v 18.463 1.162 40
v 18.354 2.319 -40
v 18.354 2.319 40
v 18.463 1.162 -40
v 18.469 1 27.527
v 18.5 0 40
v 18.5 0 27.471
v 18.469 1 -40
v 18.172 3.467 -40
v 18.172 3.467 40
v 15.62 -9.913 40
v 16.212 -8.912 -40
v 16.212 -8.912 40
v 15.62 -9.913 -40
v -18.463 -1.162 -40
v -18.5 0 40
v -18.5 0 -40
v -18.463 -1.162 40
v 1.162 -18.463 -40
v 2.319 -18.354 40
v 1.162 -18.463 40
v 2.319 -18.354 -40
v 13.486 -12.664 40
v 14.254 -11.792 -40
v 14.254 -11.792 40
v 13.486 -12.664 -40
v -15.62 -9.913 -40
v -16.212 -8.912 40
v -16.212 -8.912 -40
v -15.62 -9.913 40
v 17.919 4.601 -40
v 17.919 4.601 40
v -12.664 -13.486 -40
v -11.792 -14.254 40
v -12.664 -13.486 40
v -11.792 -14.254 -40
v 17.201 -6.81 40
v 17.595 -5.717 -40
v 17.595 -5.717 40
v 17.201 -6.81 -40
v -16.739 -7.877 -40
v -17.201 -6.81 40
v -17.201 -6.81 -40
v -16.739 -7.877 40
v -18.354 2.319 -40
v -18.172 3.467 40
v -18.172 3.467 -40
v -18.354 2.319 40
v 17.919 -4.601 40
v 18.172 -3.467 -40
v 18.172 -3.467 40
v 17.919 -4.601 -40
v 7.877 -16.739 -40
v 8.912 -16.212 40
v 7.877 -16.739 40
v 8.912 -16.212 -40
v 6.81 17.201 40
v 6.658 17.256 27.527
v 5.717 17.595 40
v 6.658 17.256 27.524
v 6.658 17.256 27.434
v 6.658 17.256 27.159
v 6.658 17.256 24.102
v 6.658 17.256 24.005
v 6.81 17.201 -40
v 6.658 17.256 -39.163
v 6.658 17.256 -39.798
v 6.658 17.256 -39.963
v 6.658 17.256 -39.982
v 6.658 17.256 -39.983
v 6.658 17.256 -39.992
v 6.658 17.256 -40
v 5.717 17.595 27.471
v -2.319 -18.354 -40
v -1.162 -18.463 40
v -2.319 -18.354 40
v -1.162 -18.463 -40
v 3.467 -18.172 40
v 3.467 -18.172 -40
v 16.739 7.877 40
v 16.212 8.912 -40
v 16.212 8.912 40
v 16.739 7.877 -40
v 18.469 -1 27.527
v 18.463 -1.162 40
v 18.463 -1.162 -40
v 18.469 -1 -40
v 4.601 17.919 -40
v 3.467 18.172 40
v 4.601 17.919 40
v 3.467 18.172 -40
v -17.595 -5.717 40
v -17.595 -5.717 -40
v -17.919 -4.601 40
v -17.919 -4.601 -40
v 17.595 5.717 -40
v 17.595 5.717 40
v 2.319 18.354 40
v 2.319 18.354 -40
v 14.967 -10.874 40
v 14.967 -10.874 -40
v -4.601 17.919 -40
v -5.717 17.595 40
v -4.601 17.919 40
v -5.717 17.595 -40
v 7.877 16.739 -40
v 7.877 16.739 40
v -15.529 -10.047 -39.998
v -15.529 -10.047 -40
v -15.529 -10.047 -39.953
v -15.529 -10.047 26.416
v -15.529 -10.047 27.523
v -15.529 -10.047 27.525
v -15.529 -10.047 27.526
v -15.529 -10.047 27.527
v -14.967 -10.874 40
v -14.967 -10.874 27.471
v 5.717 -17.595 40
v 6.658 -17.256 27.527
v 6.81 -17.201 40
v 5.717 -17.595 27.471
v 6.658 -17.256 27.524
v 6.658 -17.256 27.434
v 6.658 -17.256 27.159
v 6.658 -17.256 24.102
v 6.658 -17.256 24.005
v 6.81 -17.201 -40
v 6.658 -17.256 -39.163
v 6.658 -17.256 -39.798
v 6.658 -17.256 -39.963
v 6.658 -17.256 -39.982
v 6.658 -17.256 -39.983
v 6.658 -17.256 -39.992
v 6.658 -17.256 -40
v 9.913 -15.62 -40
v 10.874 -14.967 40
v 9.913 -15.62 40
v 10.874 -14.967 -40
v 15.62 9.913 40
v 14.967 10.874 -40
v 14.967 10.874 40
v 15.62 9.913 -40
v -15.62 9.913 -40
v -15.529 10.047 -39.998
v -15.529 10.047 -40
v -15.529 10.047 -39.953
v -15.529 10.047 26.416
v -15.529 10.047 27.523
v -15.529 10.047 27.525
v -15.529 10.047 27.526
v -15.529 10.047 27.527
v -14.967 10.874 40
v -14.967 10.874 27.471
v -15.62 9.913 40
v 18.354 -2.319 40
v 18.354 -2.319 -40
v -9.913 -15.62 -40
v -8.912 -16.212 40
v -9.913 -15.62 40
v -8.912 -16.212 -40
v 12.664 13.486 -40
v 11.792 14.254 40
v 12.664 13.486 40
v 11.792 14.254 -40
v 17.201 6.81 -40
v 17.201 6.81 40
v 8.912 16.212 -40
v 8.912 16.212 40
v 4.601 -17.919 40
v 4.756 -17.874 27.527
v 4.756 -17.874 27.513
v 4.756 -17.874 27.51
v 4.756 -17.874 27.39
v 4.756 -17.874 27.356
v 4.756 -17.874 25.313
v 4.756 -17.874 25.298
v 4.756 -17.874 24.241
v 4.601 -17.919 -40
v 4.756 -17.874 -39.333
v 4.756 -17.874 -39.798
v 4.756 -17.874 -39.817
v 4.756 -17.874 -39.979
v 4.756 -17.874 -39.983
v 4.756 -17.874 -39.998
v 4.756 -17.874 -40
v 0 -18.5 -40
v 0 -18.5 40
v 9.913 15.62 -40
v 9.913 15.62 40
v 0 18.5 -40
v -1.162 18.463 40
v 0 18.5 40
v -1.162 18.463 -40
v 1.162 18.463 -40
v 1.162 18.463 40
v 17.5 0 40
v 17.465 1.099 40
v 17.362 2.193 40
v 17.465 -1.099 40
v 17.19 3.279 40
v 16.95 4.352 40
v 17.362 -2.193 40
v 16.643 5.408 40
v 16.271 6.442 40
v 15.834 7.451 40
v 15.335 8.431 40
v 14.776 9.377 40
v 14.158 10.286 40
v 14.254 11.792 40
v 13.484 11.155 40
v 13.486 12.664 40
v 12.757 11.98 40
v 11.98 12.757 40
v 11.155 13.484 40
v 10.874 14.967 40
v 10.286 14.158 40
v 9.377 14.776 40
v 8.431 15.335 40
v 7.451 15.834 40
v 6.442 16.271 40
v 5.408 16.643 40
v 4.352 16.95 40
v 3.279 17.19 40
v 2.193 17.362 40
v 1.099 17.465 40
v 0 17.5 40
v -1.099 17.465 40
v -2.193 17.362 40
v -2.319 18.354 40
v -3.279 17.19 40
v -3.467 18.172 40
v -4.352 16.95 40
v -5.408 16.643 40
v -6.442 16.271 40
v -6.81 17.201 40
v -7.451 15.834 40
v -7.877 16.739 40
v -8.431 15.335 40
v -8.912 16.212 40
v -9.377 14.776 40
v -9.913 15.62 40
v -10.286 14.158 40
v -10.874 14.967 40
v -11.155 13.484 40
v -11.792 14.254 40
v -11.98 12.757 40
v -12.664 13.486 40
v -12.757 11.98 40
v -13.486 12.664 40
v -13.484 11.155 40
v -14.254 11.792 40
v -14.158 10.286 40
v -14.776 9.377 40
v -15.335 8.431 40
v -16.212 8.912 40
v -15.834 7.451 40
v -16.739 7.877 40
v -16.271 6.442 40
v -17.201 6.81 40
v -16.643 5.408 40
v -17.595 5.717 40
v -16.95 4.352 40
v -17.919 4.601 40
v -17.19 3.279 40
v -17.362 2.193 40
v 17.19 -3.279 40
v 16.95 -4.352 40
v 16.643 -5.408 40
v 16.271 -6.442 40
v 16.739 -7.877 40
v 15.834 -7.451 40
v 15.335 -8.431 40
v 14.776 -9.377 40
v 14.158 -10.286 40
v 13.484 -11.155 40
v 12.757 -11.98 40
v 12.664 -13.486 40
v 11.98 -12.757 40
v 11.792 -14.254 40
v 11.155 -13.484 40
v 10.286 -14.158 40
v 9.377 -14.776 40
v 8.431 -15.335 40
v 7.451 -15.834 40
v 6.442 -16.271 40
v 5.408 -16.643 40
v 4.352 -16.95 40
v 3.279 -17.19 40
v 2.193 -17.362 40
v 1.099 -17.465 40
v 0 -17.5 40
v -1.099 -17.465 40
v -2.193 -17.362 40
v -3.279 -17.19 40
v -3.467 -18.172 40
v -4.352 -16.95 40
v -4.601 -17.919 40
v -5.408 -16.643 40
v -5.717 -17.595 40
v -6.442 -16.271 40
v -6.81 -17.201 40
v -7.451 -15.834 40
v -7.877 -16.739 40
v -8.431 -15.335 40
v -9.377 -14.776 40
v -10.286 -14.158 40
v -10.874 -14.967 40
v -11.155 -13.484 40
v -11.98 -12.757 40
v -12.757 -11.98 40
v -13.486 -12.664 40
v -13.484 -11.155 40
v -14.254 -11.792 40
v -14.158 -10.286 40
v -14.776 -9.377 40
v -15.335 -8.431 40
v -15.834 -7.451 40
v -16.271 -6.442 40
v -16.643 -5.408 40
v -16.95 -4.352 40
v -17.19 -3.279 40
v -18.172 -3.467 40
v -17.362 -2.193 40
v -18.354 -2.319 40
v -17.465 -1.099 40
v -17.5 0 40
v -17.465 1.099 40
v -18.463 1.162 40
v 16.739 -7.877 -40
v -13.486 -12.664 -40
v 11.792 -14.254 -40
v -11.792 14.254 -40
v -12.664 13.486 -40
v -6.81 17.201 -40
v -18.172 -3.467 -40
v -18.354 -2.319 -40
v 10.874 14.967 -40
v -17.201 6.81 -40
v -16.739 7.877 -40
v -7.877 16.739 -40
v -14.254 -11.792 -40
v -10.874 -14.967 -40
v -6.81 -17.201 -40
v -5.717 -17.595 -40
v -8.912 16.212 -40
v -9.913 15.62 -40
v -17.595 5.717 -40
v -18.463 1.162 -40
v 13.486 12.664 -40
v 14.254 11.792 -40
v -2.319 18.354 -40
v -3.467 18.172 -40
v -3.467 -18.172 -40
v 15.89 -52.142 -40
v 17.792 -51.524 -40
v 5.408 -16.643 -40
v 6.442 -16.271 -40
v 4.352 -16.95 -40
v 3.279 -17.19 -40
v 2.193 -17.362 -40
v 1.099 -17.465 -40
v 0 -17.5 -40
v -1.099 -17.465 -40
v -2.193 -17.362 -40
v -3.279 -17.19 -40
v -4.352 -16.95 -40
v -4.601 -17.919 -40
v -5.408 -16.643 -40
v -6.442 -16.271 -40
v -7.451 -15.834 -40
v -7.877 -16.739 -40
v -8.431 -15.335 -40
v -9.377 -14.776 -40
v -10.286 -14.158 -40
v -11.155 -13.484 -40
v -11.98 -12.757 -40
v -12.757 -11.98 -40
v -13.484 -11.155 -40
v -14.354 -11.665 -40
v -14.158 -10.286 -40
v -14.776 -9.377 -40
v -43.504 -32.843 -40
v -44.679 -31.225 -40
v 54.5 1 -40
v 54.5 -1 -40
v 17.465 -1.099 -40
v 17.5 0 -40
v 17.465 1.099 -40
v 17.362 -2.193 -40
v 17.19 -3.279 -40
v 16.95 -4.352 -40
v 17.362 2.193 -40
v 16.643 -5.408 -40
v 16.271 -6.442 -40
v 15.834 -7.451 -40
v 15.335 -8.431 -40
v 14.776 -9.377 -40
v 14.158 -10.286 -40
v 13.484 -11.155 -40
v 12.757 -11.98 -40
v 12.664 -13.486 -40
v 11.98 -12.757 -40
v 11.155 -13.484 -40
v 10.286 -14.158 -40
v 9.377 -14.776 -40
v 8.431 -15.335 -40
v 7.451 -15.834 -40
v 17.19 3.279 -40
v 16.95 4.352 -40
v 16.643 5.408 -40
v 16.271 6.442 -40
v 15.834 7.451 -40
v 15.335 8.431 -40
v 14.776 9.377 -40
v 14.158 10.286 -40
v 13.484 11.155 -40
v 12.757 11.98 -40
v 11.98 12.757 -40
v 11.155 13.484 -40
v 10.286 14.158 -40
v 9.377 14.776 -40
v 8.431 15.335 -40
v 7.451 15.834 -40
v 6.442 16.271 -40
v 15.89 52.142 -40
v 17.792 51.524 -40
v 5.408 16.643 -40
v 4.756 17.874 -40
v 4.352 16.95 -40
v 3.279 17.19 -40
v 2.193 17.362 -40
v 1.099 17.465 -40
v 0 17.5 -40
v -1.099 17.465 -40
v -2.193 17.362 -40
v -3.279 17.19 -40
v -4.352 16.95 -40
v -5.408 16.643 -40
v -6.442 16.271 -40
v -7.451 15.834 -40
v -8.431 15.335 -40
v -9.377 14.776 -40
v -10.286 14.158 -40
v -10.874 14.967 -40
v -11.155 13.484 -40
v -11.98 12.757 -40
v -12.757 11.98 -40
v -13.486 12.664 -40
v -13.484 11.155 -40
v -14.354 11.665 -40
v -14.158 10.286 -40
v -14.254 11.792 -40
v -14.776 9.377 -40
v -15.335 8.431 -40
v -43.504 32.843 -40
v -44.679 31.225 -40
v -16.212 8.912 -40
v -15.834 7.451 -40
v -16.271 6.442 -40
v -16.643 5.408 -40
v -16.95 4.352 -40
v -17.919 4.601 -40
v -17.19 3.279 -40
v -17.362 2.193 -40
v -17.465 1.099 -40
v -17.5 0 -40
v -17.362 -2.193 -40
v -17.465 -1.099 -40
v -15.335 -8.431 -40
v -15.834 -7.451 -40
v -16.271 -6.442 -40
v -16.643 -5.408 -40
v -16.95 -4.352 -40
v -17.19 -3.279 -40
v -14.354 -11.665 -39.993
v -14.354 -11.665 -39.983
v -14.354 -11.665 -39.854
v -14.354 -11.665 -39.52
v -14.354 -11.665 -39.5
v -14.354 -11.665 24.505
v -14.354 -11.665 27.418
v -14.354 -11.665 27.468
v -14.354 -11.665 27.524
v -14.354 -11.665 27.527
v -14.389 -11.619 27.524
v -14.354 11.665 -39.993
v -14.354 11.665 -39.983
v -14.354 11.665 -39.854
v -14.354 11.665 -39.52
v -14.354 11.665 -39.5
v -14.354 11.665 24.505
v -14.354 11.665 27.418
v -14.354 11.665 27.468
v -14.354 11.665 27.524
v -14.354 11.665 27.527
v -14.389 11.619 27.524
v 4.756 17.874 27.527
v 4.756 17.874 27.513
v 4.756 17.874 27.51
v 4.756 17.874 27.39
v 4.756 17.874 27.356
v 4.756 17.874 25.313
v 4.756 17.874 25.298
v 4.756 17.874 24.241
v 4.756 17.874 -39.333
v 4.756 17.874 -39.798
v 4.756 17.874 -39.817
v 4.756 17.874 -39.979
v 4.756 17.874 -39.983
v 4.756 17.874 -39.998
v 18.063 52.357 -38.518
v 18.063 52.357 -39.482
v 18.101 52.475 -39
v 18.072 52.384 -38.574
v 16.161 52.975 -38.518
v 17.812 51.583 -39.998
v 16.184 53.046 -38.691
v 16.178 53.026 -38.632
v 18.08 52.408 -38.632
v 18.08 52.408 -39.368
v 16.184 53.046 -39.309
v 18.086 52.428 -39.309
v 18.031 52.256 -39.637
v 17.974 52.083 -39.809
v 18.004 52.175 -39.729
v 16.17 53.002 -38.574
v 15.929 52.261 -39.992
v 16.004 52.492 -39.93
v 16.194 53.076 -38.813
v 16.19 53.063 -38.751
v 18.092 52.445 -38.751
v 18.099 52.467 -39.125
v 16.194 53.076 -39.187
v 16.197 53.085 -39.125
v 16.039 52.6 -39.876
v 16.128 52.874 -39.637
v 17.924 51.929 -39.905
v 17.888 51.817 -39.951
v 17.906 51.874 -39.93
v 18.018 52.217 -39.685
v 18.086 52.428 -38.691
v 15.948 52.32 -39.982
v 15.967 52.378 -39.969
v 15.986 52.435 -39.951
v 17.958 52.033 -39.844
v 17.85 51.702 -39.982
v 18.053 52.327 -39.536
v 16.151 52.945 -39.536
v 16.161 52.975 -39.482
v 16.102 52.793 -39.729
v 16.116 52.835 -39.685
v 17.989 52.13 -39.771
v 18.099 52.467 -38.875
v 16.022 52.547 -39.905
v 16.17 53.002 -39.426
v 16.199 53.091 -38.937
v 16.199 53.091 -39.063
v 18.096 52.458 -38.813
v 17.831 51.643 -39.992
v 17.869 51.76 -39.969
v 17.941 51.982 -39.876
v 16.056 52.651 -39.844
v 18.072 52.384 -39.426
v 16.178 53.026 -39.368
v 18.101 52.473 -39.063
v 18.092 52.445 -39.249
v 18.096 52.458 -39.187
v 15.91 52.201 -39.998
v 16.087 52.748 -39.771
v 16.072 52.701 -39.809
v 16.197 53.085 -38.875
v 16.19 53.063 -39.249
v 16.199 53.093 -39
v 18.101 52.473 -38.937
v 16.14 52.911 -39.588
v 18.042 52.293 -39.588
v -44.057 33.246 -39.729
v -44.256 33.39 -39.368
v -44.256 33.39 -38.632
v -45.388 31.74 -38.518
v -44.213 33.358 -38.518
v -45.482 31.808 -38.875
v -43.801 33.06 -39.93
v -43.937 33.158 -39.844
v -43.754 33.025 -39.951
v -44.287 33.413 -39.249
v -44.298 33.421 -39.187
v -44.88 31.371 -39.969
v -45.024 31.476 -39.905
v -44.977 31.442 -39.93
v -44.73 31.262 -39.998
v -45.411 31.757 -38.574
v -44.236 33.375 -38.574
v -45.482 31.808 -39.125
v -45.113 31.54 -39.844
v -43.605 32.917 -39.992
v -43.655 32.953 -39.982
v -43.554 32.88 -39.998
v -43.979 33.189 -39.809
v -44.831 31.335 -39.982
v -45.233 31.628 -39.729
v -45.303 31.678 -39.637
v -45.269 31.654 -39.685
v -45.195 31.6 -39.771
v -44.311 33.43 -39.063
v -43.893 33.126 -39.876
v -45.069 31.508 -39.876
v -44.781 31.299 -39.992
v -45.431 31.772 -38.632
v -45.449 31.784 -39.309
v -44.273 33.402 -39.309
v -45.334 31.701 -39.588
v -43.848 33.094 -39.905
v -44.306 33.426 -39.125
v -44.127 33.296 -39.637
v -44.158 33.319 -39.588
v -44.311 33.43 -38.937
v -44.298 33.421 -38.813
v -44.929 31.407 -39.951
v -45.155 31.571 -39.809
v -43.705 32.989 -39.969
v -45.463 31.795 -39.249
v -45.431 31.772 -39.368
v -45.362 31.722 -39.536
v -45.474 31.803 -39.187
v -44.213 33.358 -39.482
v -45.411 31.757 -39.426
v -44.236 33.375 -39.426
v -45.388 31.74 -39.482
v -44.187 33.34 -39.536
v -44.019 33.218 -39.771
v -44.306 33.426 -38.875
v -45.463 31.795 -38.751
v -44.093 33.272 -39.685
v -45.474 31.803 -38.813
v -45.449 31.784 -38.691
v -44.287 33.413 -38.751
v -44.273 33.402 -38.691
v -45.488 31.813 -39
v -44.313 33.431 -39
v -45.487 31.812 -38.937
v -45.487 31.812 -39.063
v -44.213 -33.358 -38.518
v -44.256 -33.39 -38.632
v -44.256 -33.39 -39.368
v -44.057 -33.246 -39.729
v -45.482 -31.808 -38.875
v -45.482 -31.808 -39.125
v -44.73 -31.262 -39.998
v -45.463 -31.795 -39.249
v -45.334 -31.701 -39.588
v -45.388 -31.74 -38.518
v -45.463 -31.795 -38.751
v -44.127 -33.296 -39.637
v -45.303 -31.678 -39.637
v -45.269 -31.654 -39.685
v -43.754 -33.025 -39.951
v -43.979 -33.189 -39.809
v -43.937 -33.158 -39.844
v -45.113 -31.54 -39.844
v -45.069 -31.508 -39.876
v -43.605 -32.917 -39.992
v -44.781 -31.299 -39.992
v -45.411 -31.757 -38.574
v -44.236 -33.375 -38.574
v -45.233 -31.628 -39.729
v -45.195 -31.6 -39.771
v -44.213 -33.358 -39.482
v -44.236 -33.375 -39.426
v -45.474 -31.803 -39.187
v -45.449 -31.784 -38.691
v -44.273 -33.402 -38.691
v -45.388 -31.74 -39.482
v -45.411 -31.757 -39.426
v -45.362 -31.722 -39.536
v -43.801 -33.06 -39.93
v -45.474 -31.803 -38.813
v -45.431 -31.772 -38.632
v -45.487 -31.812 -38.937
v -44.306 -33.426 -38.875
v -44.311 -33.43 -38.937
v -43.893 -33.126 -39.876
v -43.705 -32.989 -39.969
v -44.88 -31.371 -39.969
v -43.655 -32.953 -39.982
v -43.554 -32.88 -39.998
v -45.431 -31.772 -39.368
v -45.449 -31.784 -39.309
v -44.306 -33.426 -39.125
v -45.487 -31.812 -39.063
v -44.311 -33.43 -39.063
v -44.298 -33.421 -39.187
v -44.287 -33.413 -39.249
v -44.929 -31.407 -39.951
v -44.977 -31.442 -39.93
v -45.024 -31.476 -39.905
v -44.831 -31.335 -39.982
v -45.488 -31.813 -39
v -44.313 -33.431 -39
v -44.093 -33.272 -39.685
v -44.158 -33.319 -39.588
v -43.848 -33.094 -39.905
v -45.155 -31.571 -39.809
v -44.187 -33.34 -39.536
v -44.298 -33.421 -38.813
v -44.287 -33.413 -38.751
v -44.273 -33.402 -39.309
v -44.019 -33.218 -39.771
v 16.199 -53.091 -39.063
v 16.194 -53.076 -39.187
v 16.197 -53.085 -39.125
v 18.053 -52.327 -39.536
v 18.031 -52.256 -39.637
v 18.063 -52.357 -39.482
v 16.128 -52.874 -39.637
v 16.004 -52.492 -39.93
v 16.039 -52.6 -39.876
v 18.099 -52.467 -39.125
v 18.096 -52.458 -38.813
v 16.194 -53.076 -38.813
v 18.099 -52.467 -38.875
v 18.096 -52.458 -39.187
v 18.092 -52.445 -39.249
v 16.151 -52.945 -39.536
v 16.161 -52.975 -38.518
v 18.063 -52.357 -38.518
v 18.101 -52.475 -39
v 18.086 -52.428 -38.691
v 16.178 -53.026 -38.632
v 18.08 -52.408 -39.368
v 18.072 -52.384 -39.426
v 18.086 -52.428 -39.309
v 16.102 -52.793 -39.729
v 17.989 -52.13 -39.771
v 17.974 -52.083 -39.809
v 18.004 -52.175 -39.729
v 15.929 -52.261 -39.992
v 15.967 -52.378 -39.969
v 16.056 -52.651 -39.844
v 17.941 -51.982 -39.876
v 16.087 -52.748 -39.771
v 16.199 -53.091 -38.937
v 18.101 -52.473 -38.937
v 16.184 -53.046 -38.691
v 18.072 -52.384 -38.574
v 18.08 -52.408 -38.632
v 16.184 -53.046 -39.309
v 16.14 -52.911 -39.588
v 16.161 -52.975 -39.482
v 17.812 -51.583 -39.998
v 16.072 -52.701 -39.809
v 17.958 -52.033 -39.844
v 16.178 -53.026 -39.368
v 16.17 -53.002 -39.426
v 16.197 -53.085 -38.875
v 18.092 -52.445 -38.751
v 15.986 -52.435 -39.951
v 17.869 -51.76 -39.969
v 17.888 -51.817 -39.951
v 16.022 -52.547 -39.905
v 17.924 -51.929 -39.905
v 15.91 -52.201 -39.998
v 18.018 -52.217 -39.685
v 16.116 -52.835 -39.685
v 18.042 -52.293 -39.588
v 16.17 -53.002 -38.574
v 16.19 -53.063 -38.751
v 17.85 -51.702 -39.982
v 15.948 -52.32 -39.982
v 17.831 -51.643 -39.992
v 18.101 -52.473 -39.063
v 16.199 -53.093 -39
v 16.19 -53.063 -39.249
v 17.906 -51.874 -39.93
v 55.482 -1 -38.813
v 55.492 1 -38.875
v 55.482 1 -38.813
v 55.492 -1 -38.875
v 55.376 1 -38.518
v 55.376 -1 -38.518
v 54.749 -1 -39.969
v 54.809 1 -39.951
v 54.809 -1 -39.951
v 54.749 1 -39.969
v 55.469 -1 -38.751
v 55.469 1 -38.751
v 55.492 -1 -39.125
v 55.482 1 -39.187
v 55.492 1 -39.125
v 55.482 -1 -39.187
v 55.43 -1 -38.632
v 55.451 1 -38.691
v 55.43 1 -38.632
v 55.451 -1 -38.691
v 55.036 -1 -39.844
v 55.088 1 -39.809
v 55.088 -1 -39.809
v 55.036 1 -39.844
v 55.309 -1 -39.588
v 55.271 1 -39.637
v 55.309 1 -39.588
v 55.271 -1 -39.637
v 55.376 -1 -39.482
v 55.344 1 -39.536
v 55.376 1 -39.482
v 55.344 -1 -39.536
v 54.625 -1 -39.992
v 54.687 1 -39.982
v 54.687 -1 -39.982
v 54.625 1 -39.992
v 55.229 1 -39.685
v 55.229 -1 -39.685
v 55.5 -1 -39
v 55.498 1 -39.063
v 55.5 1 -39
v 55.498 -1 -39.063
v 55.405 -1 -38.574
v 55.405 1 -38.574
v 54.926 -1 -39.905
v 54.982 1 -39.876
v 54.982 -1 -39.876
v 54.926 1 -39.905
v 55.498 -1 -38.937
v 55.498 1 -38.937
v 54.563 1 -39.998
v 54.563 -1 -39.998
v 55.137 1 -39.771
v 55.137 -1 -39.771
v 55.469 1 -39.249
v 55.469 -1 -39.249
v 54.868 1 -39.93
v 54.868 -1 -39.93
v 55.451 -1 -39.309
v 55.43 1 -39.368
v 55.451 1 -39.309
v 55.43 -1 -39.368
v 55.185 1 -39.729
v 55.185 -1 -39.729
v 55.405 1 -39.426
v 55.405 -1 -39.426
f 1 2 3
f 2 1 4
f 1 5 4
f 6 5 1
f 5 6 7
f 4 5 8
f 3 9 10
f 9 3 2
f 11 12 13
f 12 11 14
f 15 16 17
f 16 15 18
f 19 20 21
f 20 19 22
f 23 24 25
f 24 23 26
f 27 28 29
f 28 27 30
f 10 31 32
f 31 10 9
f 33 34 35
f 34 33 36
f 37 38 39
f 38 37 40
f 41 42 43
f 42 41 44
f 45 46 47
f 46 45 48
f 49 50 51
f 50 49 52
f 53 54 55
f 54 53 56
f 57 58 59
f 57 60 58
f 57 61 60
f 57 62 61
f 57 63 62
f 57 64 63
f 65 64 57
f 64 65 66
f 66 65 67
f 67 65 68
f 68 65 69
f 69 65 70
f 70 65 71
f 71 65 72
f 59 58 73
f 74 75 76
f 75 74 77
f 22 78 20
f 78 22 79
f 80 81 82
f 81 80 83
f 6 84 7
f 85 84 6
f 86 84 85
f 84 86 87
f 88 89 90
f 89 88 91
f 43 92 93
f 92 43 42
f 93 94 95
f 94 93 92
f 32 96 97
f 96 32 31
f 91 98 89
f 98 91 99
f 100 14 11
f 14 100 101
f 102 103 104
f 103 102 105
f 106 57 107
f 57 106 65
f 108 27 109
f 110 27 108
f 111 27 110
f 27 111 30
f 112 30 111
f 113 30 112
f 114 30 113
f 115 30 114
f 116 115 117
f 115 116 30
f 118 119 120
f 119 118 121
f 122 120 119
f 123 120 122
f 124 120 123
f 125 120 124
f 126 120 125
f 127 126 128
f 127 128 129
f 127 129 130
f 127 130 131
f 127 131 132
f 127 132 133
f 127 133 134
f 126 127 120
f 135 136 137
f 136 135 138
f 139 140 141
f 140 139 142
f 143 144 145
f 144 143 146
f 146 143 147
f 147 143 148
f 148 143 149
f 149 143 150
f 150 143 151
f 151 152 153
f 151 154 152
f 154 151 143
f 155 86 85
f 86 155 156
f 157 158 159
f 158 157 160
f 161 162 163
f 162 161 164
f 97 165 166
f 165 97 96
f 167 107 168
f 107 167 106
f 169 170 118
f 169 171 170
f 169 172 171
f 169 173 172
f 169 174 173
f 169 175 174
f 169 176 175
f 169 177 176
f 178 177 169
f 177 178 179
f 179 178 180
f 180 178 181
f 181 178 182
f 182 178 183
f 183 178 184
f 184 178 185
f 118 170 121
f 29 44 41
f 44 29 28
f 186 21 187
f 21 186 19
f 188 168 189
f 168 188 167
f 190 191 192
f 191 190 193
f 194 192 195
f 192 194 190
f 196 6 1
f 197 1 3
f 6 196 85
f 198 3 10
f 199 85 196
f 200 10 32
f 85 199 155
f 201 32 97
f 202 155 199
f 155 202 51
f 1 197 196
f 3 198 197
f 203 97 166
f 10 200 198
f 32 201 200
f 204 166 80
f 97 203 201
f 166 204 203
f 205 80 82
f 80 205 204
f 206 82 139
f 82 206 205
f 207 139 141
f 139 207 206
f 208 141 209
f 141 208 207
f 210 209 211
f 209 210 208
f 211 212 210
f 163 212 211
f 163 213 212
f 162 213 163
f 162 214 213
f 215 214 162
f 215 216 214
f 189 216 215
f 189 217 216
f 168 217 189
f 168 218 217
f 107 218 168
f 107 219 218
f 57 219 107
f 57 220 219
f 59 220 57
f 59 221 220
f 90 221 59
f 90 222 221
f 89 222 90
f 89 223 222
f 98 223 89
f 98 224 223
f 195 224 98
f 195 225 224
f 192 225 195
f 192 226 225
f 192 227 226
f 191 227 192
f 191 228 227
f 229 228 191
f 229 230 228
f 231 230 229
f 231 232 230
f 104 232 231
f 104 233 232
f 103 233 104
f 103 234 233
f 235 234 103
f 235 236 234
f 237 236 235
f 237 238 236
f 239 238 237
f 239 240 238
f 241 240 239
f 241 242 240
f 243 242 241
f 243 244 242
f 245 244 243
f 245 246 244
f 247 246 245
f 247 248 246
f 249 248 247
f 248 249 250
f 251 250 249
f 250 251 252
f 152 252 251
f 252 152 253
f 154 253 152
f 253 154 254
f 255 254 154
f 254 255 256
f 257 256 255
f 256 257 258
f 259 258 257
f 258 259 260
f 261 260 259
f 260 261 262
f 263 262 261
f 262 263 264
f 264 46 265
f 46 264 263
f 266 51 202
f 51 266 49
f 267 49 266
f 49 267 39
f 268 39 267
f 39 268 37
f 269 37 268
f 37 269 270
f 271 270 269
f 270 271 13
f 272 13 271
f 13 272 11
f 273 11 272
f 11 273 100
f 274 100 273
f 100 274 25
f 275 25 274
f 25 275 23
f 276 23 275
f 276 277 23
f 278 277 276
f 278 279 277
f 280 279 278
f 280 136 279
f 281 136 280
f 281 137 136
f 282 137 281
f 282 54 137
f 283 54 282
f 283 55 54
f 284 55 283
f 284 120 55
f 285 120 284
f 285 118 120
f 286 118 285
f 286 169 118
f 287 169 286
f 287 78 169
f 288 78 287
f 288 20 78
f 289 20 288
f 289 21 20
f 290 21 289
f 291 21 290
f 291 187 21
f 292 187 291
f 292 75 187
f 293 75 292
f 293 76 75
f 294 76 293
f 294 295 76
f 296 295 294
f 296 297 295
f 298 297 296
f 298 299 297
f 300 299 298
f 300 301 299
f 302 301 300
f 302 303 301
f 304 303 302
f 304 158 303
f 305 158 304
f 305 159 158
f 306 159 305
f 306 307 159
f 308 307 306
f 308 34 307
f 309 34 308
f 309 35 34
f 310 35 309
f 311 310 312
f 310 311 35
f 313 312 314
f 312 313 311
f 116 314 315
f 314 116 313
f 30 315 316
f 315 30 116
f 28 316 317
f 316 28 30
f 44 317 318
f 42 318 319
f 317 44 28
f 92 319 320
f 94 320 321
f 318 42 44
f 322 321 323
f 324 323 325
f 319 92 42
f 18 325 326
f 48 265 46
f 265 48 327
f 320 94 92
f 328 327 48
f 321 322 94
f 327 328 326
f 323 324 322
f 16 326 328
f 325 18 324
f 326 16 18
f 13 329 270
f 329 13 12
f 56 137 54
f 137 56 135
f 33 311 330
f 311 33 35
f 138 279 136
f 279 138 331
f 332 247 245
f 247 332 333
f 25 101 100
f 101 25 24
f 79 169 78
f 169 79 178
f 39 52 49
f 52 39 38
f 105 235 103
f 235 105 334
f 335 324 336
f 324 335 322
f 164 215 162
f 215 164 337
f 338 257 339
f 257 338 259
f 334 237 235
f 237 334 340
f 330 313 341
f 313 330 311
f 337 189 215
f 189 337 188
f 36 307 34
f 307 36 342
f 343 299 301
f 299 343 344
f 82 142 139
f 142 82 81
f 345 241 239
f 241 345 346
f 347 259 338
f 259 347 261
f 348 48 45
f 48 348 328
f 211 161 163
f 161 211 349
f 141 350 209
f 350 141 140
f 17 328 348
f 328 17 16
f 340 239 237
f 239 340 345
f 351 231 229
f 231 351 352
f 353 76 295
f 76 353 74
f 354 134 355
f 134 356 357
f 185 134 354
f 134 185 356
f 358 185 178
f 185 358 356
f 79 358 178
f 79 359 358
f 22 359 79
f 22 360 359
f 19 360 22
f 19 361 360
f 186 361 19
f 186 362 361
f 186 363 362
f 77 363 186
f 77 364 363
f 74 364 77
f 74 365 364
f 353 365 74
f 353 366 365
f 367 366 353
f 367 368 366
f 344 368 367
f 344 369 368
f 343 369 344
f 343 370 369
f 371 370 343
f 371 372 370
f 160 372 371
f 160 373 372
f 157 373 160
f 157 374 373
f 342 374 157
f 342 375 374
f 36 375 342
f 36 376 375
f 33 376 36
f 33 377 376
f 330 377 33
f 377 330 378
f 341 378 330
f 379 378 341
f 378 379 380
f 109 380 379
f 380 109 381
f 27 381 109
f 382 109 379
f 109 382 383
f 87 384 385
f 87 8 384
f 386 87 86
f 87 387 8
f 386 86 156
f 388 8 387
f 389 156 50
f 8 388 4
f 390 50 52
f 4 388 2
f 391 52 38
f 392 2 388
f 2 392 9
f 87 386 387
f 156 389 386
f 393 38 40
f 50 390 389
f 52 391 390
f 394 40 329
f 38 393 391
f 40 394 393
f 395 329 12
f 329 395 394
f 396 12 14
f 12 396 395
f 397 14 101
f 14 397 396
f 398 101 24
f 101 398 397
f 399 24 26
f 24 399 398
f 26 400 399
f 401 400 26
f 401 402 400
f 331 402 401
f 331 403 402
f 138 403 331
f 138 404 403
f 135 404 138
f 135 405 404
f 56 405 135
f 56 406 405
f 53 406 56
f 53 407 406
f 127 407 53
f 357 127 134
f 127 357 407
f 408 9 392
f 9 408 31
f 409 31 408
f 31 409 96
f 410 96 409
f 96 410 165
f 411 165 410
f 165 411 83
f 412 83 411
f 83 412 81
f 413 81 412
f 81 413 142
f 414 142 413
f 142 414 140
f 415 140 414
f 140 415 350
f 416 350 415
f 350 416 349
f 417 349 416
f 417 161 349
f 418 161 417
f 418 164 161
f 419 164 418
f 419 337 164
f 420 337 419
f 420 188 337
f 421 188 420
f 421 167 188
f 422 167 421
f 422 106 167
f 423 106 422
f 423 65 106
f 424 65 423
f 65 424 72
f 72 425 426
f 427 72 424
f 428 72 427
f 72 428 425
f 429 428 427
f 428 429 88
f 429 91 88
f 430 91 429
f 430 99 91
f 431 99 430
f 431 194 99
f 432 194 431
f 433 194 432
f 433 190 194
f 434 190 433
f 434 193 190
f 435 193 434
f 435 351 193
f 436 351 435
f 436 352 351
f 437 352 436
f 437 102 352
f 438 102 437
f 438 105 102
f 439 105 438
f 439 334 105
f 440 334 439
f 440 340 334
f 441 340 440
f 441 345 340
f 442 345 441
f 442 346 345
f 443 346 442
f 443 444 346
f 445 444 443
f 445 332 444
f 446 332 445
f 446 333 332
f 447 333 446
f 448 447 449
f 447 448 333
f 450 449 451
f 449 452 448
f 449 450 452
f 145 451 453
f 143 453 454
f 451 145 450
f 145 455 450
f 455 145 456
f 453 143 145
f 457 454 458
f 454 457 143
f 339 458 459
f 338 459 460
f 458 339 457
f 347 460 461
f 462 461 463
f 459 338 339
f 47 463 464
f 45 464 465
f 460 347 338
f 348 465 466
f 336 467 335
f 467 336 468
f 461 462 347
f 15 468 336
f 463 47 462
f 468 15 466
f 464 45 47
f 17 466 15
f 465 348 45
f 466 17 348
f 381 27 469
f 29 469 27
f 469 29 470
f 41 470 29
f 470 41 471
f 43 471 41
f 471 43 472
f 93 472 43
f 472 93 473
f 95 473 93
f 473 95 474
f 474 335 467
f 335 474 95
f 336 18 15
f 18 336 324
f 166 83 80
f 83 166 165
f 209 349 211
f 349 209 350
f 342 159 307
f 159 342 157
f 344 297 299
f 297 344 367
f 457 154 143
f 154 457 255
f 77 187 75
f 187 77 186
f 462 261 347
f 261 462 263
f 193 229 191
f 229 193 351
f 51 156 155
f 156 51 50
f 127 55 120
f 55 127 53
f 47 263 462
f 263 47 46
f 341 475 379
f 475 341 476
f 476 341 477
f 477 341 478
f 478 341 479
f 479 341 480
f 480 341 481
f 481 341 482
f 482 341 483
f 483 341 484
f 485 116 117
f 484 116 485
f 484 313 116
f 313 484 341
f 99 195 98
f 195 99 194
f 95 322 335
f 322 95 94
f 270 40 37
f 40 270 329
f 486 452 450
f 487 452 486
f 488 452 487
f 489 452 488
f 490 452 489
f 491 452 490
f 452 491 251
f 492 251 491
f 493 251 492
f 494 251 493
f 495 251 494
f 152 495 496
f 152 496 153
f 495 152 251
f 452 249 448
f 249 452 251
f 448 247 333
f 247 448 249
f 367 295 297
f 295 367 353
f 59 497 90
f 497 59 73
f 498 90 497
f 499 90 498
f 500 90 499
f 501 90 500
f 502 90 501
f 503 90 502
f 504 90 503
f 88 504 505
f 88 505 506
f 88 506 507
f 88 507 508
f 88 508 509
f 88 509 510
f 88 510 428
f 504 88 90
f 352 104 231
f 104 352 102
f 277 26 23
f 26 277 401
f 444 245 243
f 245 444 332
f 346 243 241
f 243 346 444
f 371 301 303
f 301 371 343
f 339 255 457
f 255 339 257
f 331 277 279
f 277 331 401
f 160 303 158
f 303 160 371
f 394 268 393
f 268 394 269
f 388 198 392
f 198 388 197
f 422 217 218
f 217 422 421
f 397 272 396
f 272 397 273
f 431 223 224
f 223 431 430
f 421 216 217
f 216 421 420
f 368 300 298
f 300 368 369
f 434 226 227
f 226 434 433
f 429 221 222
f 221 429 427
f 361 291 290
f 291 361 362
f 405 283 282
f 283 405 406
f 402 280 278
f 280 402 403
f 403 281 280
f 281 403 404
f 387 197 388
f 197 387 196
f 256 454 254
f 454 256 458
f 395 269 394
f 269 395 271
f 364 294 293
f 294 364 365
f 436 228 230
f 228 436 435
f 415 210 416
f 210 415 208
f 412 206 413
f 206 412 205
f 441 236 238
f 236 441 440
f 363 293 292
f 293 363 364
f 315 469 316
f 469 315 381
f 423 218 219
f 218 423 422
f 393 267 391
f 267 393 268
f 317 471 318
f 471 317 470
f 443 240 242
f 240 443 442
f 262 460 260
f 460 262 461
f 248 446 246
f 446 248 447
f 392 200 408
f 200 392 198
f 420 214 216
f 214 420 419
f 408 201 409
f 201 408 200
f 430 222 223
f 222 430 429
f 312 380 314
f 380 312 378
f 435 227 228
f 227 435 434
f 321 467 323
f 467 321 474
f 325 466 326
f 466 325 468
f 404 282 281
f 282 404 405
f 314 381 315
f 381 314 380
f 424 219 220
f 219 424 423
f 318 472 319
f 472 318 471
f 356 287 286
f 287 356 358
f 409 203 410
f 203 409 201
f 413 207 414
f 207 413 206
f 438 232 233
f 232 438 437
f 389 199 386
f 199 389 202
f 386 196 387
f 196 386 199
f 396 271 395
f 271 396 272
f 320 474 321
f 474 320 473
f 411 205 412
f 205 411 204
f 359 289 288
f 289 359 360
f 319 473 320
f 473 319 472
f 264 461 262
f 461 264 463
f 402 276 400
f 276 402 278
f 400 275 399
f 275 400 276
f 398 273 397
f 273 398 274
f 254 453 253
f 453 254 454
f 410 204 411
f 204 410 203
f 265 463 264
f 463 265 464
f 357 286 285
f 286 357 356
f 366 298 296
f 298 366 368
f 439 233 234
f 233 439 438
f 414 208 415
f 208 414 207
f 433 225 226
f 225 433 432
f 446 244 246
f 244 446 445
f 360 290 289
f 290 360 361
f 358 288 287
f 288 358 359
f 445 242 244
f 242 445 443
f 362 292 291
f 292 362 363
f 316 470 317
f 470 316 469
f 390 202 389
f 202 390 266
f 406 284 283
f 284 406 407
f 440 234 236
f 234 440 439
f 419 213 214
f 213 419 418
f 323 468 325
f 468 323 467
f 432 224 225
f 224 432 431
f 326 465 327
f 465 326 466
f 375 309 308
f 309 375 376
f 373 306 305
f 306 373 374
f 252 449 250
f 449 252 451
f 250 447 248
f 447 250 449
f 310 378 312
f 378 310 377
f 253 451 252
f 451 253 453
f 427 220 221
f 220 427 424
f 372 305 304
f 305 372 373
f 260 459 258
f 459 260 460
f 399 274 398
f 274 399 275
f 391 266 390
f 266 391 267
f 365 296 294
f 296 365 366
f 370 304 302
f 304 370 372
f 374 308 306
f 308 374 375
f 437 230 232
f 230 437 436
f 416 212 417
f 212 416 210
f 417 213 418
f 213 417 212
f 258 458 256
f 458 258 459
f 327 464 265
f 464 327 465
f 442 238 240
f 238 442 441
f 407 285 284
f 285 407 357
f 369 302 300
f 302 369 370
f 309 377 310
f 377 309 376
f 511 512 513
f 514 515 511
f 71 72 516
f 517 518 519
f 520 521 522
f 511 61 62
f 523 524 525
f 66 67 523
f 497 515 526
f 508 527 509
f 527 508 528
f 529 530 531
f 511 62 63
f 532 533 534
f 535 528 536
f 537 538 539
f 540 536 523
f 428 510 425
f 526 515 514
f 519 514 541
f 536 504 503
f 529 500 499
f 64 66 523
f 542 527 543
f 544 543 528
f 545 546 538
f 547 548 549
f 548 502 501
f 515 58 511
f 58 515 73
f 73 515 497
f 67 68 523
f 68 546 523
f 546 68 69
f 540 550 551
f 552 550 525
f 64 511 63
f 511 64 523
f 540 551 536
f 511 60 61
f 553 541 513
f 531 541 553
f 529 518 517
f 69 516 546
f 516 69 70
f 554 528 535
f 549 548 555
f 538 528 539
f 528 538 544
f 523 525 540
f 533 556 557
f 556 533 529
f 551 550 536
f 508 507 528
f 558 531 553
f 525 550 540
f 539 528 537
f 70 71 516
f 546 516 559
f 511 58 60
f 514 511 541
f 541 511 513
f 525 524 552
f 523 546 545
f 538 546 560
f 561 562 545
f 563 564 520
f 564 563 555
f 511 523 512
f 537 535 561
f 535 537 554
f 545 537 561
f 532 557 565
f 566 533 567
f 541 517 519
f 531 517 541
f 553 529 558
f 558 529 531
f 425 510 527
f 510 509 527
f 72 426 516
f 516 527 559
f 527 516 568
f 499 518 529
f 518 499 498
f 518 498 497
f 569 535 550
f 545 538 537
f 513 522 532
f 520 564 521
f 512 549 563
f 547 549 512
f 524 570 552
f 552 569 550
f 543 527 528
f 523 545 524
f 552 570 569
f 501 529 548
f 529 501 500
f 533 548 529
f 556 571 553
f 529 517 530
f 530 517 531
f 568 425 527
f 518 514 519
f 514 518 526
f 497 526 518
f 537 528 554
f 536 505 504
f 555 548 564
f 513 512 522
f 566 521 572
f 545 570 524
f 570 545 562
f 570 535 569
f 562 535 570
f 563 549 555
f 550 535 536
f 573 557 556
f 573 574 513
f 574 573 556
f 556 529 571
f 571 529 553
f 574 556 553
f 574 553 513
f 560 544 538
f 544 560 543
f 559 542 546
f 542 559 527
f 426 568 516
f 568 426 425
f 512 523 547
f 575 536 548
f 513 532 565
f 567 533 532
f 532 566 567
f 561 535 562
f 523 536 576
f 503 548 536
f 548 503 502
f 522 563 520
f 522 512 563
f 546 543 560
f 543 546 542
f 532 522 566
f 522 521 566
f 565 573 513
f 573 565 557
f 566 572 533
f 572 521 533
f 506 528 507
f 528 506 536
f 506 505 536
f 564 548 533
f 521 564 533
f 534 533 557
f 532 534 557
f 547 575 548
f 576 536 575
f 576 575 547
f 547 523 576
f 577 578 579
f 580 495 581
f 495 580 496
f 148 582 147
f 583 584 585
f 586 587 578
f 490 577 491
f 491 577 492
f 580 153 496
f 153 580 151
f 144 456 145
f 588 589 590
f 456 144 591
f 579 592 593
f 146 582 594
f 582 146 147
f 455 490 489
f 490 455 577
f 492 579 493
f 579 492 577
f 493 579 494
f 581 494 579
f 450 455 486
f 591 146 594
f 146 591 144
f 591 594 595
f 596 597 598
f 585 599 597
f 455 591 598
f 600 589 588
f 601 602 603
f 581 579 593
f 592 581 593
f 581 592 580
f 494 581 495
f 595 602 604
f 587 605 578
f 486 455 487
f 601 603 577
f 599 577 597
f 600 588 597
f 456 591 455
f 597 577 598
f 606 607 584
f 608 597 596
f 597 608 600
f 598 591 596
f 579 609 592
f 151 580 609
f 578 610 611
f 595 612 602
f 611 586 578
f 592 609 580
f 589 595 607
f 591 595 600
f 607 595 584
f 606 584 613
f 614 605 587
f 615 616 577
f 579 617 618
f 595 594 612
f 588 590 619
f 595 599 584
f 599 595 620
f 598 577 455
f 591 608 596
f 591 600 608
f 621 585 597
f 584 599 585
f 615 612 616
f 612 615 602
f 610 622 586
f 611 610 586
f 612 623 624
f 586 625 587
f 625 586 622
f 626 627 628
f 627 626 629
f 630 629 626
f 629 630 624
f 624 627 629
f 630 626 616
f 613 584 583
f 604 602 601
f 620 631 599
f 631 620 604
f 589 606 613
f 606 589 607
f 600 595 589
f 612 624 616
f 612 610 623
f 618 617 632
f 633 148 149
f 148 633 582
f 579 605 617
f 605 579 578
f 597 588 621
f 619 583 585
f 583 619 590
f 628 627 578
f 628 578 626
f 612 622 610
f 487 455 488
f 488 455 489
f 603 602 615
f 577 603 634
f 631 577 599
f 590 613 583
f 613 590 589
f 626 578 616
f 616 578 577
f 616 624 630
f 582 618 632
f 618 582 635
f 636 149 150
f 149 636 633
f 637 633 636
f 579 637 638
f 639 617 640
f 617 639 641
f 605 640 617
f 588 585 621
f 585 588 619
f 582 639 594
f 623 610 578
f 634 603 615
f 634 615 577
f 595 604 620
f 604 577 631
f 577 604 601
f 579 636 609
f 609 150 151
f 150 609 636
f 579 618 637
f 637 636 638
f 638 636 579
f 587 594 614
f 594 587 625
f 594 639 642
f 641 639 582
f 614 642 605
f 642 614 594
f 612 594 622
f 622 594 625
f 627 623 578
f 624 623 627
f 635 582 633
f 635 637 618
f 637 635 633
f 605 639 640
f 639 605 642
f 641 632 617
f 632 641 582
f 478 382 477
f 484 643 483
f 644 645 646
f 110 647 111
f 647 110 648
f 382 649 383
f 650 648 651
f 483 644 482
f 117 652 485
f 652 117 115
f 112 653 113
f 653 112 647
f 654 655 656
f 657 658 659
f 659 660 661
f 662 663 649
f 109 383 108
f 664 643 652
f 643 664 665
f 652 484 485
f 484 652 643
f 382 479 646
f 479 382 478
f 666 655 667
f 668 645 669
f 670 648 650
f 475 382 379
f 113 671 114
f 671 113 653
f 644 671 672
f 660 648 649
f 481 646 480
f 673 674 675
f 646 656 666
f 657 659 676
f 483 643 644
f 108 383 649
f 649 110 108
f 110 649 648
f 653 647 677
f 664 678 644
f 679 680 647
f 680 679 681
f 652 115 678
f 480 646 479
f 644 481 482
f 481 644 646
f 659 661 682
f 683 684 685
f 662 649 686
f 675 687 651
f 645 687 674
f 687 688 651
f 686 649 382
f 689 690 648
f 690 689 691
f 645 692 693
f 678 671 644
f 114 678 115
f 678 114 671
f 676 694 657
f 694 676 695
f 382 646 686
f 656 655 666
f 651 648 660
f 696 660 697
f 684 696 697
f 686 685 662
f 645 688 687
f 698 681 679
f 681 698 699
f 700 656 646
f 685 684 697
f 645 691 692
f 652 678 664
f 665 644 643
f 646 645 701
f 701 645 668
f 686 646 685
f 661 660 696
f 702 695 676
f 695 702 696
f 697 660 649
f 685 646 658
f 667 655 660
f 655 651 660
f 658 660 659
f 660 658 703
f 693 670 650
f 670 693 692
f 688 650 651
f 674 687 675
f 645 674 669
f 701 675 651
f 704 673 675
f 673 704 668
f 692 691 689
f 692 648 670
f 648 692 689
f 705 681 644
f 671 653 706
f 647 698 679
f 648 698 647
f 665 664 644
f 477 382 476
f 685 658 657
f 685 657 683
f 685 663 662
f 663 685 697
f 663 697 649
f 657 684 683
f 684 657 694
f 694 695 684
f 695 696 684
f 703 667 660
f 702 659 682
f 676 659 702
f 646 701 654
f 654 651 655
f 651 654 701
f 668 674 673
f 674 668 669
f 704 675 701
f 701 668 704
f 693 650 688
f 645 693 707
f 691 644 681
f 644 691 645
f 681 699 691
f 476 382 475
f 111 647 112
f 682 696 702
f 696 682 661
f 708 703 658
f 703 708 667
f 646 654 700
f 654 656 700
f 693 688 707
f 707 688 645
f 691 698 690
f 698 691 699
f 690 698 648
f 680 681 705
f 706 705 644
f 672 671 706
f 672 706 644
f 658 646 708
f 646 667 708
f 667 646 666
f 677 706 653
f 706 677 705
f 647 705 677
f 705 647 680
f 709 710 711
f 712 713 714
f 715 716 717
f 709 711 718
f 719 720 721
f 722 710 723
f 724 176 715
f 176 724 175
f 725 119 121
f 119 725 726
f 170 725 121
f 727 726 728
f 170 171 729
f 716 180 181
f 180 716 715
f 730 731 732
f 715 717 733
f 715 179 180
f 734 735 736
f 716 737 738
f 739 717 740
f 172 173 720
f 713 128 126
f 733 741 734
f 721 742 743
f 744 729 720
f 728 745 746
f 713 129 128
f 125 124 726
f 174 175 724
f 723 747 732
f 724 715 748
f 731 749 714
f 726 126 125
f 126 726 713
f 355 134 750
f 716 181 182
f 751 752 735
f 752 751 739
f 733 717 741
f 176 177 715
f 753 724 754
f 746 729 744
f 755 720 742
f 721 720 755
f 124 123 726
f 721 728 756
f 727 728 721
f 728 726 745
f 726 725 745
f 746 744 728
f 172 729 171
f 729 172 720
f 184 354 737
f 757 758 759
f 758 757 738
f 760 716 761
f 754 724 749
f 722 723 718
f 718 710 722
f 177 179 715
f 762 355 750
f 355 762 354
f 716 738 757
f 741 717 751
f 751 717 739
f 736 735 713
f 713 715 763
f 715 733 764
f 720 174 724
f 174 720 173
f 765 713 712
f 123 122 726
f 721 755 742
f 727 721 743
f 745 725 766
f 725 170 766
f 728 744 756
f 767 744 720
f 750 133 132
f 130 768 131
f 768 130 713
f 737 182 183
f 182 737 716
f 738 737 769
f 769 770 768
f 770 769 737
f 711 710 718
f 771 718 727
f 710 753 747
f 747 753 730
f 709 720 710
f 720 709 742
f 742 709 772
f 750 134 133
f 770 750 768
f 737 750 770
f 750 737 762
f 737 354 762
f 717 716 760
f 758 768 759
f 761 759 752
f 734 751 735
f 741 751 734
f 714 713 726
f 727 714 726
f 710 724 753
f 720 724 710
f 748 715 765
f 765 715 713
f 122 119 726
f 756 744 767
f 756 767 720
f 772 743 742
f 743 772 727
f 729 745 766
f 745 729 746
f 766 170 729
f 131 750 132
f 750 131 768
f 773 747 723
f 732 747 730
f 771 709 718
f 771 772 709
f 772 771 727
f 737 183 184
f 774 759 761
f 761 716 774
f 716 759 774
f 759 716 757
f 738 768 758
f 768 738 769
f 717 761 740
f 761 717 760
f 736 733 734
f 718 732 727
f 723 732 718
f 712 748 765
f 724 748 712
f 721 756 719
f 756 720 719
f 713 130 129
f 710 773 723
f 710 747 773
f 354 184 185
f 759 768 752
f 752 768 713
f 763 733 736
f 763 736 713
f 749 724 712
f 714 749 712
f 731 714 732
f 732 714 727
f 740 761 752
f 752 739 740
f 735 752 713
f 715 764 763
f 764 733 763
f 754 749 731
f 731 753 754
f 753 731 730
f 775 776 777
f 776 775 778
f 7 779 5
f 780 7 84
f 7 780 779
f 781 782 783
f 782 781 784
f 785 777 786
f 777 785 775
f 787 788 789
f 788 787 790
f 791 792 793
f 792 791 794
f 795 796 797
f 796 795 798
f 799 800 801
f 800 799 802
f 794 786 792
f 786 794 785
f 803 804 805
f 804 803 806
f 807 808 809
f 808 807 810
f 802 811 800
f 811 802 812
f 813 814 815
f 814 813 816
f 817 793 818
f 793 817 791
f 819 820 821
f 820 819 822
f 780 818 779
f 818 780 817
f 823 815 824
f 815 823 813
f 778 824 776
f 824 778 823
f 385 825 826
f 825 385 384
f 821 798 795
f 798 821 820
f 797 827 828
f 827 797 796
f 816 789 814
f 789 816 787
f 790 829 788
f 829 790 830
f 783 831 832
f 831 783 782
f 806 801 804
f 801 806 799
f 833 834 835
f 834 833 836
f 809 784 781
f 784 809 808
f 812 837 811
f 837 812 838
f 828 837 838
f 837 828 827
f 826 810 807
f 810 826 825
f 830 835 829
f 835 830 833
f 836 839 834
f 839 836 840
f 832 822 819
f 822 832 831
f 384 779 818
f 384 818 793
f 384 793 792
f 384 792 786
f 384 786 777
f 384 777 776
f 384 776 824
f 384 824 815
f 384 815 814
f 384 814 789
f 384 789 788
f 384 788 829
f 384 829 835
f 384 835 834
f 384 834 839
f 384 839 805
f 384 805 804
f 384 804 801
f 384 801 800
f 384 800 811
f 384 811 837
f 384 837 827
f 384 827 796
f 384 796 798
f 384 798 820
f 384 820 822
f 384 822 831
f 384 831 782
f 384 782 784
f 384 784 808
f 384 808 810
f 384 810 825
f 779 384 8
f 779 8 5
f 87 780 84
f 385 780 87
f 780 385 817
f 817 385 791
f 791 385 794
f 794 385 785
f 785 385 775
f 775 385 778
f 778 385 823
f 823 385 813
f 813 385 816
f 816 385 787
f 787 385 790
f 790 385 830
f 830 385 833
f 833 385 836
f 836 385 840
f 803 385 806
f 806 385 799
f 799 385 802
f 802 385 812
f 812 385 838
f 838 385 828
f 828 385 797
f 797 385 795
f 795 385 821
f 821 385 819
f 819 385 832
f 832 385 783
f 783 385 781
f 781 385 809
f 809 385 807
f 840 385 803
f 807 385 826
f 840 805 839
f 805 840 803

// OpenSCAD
// Rocket Fin Maker

// Fins
$finNumber = 5;
$finThickness = 2;
$finHeight = 70;
$finWidth = 40;
$finCornerRadius = 1; // Has to be > 0
$finOffsetFromBottom = 0;
$finAngle = 0; // Workable max fin angle is dictated by fin length

// Body cylinder 
// This is defined by inner cylinder, so if the rocket is 40mm then this needs to be something like 41mm
$cylinderDiameter = 35;
$cylinderHeight = 80; // 
$wallThickness = 1;





// Leave these variables alone!
$fn=100;
$finOffsetForAngle = $finAngle*0.05; // This tries to keep the top of the fins in the cylinder, betterer maths would work betterer. Something something exponential or log.
$finInsertDepth = $finAngle * 0.25;
$cylinderOuterRadius = $cylinderDiameter/2 + $wallThickness;
$incrementDegrees = 360/$finNumber;
$cylinderRadius = $cylinderDiameter/2;

difference() {
    // Outer Cylinder
    cylinder($cylinderHeight,$cylinderOuterRadius,$cylinderOuterRadius, true);

    // Inner Cylinder
    cylinder($cylinderHeight+1000,$cylinderRadius,$cylinderRadius, true);

}

difference() {
    for (a =[$incrementDegrees:$incrementDegrees:360]) {
        rotate([0,0,a]) {
            createFin();
        }
    }
    
    // Inner Cylinder
    cylinder($cylinderHeight+990,$cylinderRadius,$cylinderRadius, true);
}

module createFin() {
 rotate([90,0,0]) {
        translate([$cylinderRadius-($finCornerRadius*2)-$finInsertDepth,-(($finHeight/2)+(($cylinderHeight-$finHeight)/2)-$finOffsetForAngle-$finOffsetFromBottom),-$finThickness/2]) {
            rotate([$finAngle,0,0]) {
                right_triangle($finWidth,$finHeight,$finCornerRadius,$finThickness);
        
                }
            }
    }   
}

module right_triangle(side1,side2,corner_radius,triangle_height){
  translate([corner_radius,corner_radius,0]){  
    hull(){  
    cylinder(r=corner_radius,h=triangle_height);
      translate([side1 - corner_radius * 2,0,0])cylinder(r=corner_radius,h=triangle_height);
          translate([0,side2 - corner_radius * 2,0])cylinder(r=corner_radius,h=triangle_height);  
    }
  }
    
}
